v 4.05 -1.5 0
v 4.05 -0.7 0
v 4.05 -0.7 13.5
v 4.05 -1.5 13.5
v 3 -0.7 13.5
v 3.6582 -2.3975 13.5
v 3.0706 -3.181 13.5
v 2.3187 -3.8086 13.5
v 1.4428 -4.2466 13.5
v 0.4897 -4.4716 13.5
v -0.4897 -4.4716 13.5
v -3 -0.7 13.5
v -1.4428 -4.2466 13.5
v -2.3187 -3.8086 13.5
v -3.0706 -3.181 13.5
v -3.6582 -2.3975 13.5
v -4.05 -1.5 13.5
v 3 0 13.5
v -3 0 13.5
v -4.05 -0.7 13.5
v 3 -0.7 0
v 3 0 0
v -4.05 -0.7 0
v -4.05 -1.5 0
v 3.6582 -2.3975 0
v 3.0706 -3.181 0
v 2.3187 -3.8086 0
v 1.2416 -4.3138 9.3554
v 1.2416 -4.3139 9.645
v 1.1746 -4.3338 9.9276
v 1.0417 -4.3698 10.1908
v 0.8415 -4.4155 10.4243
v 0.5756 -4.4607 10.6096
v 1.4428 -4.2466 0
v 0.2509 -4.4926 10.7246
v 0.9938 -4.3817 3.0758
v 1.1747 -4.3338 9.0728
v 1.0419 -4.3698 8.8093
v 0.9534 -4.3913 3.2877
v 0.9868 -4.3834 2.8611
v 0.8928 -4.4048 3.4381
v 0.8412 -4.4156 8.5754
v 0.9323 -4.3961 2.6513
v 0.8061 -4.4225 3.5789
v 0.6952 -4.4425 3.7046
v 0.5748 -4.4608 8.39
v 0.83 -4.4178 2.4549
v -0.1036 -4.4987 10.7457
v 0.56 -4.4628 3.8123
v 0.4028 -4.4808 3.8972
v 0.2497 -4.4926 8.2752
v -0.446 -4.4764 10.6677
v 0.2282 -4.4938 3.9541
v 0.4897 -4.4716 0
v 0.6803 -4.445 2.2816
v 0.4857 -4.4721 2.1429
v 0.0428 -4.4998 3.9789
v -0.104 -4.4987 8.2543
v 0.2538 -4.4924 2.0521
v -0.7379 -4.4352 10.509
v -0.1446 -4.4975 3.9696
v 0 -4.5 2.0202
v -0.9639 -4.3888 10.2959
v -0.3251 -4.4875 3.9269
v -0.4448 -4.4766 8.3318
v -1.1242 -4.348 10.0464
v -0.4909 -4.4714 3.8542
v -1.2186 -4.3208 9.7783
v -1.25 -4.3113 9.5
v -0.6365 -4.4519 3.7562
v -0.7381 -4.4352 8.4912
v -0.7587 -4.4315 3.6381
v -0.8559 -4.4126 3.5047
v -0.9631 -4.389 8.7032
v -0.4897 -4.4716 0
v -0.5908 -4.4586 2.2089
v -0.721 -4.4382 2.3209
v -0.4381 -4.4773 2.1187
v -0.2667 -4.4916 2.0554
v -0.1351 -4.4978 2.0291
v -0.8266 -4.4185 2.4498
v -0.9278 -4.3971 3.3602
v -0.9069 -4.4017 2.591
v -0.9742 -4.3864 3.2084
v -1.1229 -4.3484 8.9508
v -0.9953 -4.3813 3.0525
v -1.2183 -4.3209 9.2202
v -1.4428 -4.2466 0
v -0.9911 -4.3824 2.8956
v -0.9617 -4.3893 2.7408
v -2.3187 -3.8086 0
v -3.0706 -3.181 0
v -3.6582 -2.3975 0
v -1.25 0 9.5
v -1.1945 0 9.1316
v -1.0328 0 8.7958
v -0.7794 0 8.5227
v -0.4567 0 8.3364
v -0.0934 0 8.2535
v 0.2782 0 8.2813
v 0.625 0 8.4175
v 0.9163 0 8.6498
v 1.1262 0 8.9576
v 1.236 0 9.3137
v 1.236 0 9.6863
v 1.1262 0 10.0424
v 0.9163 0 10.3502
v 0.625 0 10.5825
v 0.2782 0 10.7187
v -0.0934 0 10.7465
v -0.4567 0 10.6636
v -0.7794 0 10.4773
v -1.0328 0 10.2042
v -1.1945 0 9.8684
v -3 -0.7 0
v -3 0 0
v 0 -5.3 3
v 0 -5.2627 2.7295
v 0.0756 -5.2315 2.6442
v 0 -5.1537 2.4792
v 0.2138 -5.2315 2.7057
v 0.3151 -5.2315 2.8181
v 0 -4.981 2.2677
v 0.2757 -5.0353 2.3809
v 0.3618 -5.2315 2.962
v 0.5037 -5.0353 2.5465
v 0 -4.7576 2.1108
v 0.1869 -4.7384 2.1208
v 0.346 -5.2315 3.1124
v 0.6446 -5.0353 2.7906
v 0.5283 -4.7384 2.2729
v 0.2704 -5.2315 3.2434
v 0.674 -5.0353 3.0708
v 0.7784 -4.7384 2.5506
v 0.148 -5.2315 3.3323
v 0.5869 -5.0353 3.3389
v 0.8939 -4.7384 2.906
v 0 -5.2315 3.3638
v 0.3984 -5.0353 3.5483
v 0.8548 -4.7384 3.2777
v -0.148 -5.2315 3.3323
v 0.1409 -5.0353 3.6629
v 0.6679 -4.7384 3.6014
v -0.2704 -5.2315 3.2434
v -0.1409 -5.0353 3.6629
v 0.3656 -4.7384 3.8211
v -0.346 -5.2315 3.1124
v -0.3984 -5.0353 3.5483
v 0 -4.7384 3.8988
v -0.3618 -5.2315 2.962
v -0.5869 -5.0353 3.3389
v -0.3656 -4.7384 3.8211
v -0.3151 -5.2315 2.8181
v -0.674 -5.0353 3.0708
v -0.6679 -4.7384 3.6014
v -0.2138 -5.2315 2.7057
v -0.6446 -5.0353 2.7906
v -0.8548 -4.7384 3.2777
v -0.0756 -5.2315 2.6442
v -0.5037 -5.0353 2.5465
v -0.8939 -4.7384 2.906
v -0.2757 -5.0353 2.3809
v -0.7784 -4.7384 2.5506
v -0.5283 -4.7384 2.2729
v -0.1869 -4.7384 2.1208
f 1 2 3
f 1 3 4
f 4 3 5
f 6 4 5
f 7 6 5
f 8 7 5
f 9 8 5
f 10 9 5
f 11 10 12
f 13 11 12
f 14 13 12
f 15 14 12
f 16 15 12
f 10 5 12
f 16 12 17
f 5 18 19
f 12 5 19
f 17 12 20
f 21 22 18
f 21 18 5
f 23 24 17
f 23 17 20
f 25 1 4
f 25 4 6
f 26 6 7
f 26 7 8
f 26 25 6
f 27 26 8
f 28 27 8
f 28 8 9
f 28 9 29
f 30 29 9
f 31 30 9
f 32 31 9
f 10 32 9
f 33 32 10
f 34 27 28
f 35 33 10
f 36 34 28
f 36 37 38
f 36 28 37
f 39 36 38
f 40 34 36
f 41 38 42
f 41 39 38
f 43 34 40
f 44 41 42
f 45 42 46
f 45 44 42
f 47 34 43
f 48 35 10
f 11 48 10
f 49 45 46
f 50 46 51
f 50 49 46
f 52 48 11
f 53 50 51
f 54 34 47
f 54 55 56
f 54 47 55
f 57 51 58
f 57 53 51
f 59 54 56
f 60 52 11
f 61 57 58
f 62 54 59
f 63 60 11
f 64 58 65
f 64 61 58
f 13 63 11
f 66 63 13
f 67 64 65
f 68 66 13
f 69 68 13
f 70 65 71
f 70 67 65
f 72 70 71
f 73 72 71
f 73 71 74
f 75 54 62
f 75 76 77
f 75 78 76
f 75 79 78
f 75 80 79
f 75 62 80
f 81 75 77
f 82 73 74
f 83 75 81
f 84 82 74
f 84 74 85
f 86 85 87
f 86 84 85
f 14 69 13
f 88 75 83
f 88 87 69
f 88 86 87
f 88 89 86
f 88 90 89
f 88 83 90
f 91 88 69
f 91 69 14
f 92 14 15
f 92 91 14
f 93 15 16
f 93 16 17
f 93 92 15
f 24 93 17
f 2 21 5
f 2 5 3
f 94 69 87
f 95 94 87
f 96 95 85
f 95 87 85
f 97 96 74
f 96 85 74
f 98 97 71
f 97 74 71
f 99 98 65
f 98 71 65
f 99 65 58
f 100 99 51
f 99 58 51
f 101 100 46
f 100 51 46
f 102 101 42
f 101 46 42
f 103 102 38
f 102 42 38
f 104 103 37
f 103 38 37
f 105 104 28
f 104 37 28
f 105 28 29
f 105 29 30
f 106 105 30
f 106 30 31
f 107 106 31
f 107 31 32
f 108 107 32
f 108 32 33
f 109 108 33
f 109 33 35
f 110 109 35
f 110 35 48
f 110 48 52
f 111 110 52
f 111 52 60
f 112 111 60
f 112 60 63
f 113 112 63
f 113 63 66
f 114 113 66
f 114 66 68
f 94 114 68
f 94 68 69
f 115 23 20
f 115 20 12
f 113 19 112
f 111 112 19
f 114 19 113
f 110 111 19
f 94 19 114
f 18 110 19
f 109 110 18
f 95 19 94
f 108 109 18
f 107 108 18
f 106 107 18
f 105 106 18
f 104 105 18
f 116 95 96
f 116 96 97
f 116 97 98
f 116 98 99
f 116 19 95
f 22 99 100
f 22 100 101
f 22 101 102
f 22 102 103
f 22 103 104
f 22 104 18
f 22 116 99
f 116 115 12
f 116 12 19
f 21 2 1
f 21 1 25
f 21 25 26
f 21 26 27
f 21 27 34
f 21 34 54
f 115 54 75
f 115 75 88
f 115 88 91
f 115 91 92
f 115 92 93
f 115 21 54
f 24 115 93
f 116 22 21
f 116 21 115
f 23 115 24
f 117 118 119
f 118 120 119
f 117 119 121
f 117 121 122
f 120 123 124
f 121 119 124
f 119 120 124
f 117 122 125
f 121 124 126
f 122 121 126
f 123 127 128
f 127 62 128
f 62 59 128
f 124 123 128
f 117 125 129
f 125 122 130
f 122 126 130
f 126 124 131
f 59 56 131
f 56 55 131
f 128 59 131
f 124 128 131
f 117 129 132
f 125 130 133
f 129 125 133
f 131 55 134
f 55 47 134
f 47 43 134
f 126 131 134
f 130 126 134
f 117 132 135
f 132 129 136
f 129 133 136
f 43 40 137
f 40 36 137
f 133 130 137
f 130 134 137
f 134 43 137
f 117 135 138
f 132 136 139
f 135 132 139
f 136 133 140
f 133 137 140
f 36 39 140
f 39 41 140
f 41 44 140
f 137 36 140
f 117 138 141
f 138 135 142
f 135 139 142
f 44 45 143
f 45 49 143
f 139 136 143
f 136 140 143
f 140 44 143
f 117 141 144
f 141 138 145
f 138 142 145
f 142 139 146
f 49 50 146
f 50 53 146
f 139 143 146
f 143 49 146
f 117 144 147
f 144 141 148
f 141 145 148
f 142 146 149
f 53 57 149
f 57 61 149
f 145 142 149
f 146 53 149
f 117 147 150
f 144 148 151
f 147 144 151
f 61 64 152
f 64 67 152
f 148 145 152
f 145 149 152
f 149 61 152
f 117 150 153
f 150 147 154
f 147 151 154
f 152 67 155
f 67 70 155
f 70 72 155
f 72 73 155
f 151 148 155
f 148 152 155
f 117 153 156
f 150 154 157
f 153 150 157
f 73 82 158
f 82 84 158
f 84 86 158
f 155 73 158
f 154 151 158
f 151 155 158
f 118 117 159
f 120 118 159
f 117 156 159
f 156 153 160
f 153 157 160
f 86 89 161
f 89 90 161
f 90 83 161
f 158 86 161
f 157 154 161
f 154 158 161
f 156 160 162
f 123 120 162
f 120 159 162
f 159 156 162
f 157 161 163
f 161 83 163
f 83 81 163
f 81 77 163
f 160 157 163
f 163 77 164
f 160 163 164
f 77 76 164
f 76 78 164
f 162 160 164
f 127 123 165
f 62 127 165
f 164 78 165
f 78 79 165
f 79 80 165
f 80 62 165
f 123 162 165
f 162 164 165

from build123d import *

# Parameters (mm, degrees)
BOSS_EXTRU_1_DEPTH                        = 13.5
TROU_POUR_TARAUDAGE_POUR_TROU_TARAUD_M3_D = 2.5


with BuildPart() as part:
    # Esquisse1 → Boss.-Extru.1 (new body)
    with BuildSketch(Plane.XY):
        with BuildLine():
            Line((-3, 0), (3, 0))
            Line((3, 0), (3, -0.7))
            Line((3, -0.7), (4.05, -0.7))
            Line((4.05, -0.7), (4.05, -1.5))
            ThreePointArc((4.05, -1.5), (0, -4.5), (-4.05, -1.5))
            Line((-4.05, -1.5), (-4.05, -0.7))
            Line((-4.05, -0.7), (-3, -0.7))
            Line((-3, -0.7), (-3, 0))
        make_face()
    extrude(amount=BOSS_EXTRU_1_DEPTH)

    # Trou pour taraudage pour trou taraudé M31 (through all)
    with Locations(Plane(origin=(0, 0, 0), x_dir=(1, 0, 0), z_dir=(0, 1, 0))):
        with Locations((0, -9.5)):
            Hole(TROU_POUR_TARAUDAGE_POUR_TROU_TARAUD_M3_D / 2)

    # Esquisse4 → Révolution1 (revolve)
    with BuildSketch(Plane(origin=(0, 0, 0), x_dir=(0, 0, -1), z_dir=(1, 0, 0))):
        with BuildLine():
            Line((-3, -3.3), (-3, -5.3))
            ThreePointArc((-3, -5.3), (-2, -4.3), (-3, -3.3))
        make_face()
    revolve(axis=Axis((0, -3.3, 3), (0, -1, 0)))


solid = part.part
